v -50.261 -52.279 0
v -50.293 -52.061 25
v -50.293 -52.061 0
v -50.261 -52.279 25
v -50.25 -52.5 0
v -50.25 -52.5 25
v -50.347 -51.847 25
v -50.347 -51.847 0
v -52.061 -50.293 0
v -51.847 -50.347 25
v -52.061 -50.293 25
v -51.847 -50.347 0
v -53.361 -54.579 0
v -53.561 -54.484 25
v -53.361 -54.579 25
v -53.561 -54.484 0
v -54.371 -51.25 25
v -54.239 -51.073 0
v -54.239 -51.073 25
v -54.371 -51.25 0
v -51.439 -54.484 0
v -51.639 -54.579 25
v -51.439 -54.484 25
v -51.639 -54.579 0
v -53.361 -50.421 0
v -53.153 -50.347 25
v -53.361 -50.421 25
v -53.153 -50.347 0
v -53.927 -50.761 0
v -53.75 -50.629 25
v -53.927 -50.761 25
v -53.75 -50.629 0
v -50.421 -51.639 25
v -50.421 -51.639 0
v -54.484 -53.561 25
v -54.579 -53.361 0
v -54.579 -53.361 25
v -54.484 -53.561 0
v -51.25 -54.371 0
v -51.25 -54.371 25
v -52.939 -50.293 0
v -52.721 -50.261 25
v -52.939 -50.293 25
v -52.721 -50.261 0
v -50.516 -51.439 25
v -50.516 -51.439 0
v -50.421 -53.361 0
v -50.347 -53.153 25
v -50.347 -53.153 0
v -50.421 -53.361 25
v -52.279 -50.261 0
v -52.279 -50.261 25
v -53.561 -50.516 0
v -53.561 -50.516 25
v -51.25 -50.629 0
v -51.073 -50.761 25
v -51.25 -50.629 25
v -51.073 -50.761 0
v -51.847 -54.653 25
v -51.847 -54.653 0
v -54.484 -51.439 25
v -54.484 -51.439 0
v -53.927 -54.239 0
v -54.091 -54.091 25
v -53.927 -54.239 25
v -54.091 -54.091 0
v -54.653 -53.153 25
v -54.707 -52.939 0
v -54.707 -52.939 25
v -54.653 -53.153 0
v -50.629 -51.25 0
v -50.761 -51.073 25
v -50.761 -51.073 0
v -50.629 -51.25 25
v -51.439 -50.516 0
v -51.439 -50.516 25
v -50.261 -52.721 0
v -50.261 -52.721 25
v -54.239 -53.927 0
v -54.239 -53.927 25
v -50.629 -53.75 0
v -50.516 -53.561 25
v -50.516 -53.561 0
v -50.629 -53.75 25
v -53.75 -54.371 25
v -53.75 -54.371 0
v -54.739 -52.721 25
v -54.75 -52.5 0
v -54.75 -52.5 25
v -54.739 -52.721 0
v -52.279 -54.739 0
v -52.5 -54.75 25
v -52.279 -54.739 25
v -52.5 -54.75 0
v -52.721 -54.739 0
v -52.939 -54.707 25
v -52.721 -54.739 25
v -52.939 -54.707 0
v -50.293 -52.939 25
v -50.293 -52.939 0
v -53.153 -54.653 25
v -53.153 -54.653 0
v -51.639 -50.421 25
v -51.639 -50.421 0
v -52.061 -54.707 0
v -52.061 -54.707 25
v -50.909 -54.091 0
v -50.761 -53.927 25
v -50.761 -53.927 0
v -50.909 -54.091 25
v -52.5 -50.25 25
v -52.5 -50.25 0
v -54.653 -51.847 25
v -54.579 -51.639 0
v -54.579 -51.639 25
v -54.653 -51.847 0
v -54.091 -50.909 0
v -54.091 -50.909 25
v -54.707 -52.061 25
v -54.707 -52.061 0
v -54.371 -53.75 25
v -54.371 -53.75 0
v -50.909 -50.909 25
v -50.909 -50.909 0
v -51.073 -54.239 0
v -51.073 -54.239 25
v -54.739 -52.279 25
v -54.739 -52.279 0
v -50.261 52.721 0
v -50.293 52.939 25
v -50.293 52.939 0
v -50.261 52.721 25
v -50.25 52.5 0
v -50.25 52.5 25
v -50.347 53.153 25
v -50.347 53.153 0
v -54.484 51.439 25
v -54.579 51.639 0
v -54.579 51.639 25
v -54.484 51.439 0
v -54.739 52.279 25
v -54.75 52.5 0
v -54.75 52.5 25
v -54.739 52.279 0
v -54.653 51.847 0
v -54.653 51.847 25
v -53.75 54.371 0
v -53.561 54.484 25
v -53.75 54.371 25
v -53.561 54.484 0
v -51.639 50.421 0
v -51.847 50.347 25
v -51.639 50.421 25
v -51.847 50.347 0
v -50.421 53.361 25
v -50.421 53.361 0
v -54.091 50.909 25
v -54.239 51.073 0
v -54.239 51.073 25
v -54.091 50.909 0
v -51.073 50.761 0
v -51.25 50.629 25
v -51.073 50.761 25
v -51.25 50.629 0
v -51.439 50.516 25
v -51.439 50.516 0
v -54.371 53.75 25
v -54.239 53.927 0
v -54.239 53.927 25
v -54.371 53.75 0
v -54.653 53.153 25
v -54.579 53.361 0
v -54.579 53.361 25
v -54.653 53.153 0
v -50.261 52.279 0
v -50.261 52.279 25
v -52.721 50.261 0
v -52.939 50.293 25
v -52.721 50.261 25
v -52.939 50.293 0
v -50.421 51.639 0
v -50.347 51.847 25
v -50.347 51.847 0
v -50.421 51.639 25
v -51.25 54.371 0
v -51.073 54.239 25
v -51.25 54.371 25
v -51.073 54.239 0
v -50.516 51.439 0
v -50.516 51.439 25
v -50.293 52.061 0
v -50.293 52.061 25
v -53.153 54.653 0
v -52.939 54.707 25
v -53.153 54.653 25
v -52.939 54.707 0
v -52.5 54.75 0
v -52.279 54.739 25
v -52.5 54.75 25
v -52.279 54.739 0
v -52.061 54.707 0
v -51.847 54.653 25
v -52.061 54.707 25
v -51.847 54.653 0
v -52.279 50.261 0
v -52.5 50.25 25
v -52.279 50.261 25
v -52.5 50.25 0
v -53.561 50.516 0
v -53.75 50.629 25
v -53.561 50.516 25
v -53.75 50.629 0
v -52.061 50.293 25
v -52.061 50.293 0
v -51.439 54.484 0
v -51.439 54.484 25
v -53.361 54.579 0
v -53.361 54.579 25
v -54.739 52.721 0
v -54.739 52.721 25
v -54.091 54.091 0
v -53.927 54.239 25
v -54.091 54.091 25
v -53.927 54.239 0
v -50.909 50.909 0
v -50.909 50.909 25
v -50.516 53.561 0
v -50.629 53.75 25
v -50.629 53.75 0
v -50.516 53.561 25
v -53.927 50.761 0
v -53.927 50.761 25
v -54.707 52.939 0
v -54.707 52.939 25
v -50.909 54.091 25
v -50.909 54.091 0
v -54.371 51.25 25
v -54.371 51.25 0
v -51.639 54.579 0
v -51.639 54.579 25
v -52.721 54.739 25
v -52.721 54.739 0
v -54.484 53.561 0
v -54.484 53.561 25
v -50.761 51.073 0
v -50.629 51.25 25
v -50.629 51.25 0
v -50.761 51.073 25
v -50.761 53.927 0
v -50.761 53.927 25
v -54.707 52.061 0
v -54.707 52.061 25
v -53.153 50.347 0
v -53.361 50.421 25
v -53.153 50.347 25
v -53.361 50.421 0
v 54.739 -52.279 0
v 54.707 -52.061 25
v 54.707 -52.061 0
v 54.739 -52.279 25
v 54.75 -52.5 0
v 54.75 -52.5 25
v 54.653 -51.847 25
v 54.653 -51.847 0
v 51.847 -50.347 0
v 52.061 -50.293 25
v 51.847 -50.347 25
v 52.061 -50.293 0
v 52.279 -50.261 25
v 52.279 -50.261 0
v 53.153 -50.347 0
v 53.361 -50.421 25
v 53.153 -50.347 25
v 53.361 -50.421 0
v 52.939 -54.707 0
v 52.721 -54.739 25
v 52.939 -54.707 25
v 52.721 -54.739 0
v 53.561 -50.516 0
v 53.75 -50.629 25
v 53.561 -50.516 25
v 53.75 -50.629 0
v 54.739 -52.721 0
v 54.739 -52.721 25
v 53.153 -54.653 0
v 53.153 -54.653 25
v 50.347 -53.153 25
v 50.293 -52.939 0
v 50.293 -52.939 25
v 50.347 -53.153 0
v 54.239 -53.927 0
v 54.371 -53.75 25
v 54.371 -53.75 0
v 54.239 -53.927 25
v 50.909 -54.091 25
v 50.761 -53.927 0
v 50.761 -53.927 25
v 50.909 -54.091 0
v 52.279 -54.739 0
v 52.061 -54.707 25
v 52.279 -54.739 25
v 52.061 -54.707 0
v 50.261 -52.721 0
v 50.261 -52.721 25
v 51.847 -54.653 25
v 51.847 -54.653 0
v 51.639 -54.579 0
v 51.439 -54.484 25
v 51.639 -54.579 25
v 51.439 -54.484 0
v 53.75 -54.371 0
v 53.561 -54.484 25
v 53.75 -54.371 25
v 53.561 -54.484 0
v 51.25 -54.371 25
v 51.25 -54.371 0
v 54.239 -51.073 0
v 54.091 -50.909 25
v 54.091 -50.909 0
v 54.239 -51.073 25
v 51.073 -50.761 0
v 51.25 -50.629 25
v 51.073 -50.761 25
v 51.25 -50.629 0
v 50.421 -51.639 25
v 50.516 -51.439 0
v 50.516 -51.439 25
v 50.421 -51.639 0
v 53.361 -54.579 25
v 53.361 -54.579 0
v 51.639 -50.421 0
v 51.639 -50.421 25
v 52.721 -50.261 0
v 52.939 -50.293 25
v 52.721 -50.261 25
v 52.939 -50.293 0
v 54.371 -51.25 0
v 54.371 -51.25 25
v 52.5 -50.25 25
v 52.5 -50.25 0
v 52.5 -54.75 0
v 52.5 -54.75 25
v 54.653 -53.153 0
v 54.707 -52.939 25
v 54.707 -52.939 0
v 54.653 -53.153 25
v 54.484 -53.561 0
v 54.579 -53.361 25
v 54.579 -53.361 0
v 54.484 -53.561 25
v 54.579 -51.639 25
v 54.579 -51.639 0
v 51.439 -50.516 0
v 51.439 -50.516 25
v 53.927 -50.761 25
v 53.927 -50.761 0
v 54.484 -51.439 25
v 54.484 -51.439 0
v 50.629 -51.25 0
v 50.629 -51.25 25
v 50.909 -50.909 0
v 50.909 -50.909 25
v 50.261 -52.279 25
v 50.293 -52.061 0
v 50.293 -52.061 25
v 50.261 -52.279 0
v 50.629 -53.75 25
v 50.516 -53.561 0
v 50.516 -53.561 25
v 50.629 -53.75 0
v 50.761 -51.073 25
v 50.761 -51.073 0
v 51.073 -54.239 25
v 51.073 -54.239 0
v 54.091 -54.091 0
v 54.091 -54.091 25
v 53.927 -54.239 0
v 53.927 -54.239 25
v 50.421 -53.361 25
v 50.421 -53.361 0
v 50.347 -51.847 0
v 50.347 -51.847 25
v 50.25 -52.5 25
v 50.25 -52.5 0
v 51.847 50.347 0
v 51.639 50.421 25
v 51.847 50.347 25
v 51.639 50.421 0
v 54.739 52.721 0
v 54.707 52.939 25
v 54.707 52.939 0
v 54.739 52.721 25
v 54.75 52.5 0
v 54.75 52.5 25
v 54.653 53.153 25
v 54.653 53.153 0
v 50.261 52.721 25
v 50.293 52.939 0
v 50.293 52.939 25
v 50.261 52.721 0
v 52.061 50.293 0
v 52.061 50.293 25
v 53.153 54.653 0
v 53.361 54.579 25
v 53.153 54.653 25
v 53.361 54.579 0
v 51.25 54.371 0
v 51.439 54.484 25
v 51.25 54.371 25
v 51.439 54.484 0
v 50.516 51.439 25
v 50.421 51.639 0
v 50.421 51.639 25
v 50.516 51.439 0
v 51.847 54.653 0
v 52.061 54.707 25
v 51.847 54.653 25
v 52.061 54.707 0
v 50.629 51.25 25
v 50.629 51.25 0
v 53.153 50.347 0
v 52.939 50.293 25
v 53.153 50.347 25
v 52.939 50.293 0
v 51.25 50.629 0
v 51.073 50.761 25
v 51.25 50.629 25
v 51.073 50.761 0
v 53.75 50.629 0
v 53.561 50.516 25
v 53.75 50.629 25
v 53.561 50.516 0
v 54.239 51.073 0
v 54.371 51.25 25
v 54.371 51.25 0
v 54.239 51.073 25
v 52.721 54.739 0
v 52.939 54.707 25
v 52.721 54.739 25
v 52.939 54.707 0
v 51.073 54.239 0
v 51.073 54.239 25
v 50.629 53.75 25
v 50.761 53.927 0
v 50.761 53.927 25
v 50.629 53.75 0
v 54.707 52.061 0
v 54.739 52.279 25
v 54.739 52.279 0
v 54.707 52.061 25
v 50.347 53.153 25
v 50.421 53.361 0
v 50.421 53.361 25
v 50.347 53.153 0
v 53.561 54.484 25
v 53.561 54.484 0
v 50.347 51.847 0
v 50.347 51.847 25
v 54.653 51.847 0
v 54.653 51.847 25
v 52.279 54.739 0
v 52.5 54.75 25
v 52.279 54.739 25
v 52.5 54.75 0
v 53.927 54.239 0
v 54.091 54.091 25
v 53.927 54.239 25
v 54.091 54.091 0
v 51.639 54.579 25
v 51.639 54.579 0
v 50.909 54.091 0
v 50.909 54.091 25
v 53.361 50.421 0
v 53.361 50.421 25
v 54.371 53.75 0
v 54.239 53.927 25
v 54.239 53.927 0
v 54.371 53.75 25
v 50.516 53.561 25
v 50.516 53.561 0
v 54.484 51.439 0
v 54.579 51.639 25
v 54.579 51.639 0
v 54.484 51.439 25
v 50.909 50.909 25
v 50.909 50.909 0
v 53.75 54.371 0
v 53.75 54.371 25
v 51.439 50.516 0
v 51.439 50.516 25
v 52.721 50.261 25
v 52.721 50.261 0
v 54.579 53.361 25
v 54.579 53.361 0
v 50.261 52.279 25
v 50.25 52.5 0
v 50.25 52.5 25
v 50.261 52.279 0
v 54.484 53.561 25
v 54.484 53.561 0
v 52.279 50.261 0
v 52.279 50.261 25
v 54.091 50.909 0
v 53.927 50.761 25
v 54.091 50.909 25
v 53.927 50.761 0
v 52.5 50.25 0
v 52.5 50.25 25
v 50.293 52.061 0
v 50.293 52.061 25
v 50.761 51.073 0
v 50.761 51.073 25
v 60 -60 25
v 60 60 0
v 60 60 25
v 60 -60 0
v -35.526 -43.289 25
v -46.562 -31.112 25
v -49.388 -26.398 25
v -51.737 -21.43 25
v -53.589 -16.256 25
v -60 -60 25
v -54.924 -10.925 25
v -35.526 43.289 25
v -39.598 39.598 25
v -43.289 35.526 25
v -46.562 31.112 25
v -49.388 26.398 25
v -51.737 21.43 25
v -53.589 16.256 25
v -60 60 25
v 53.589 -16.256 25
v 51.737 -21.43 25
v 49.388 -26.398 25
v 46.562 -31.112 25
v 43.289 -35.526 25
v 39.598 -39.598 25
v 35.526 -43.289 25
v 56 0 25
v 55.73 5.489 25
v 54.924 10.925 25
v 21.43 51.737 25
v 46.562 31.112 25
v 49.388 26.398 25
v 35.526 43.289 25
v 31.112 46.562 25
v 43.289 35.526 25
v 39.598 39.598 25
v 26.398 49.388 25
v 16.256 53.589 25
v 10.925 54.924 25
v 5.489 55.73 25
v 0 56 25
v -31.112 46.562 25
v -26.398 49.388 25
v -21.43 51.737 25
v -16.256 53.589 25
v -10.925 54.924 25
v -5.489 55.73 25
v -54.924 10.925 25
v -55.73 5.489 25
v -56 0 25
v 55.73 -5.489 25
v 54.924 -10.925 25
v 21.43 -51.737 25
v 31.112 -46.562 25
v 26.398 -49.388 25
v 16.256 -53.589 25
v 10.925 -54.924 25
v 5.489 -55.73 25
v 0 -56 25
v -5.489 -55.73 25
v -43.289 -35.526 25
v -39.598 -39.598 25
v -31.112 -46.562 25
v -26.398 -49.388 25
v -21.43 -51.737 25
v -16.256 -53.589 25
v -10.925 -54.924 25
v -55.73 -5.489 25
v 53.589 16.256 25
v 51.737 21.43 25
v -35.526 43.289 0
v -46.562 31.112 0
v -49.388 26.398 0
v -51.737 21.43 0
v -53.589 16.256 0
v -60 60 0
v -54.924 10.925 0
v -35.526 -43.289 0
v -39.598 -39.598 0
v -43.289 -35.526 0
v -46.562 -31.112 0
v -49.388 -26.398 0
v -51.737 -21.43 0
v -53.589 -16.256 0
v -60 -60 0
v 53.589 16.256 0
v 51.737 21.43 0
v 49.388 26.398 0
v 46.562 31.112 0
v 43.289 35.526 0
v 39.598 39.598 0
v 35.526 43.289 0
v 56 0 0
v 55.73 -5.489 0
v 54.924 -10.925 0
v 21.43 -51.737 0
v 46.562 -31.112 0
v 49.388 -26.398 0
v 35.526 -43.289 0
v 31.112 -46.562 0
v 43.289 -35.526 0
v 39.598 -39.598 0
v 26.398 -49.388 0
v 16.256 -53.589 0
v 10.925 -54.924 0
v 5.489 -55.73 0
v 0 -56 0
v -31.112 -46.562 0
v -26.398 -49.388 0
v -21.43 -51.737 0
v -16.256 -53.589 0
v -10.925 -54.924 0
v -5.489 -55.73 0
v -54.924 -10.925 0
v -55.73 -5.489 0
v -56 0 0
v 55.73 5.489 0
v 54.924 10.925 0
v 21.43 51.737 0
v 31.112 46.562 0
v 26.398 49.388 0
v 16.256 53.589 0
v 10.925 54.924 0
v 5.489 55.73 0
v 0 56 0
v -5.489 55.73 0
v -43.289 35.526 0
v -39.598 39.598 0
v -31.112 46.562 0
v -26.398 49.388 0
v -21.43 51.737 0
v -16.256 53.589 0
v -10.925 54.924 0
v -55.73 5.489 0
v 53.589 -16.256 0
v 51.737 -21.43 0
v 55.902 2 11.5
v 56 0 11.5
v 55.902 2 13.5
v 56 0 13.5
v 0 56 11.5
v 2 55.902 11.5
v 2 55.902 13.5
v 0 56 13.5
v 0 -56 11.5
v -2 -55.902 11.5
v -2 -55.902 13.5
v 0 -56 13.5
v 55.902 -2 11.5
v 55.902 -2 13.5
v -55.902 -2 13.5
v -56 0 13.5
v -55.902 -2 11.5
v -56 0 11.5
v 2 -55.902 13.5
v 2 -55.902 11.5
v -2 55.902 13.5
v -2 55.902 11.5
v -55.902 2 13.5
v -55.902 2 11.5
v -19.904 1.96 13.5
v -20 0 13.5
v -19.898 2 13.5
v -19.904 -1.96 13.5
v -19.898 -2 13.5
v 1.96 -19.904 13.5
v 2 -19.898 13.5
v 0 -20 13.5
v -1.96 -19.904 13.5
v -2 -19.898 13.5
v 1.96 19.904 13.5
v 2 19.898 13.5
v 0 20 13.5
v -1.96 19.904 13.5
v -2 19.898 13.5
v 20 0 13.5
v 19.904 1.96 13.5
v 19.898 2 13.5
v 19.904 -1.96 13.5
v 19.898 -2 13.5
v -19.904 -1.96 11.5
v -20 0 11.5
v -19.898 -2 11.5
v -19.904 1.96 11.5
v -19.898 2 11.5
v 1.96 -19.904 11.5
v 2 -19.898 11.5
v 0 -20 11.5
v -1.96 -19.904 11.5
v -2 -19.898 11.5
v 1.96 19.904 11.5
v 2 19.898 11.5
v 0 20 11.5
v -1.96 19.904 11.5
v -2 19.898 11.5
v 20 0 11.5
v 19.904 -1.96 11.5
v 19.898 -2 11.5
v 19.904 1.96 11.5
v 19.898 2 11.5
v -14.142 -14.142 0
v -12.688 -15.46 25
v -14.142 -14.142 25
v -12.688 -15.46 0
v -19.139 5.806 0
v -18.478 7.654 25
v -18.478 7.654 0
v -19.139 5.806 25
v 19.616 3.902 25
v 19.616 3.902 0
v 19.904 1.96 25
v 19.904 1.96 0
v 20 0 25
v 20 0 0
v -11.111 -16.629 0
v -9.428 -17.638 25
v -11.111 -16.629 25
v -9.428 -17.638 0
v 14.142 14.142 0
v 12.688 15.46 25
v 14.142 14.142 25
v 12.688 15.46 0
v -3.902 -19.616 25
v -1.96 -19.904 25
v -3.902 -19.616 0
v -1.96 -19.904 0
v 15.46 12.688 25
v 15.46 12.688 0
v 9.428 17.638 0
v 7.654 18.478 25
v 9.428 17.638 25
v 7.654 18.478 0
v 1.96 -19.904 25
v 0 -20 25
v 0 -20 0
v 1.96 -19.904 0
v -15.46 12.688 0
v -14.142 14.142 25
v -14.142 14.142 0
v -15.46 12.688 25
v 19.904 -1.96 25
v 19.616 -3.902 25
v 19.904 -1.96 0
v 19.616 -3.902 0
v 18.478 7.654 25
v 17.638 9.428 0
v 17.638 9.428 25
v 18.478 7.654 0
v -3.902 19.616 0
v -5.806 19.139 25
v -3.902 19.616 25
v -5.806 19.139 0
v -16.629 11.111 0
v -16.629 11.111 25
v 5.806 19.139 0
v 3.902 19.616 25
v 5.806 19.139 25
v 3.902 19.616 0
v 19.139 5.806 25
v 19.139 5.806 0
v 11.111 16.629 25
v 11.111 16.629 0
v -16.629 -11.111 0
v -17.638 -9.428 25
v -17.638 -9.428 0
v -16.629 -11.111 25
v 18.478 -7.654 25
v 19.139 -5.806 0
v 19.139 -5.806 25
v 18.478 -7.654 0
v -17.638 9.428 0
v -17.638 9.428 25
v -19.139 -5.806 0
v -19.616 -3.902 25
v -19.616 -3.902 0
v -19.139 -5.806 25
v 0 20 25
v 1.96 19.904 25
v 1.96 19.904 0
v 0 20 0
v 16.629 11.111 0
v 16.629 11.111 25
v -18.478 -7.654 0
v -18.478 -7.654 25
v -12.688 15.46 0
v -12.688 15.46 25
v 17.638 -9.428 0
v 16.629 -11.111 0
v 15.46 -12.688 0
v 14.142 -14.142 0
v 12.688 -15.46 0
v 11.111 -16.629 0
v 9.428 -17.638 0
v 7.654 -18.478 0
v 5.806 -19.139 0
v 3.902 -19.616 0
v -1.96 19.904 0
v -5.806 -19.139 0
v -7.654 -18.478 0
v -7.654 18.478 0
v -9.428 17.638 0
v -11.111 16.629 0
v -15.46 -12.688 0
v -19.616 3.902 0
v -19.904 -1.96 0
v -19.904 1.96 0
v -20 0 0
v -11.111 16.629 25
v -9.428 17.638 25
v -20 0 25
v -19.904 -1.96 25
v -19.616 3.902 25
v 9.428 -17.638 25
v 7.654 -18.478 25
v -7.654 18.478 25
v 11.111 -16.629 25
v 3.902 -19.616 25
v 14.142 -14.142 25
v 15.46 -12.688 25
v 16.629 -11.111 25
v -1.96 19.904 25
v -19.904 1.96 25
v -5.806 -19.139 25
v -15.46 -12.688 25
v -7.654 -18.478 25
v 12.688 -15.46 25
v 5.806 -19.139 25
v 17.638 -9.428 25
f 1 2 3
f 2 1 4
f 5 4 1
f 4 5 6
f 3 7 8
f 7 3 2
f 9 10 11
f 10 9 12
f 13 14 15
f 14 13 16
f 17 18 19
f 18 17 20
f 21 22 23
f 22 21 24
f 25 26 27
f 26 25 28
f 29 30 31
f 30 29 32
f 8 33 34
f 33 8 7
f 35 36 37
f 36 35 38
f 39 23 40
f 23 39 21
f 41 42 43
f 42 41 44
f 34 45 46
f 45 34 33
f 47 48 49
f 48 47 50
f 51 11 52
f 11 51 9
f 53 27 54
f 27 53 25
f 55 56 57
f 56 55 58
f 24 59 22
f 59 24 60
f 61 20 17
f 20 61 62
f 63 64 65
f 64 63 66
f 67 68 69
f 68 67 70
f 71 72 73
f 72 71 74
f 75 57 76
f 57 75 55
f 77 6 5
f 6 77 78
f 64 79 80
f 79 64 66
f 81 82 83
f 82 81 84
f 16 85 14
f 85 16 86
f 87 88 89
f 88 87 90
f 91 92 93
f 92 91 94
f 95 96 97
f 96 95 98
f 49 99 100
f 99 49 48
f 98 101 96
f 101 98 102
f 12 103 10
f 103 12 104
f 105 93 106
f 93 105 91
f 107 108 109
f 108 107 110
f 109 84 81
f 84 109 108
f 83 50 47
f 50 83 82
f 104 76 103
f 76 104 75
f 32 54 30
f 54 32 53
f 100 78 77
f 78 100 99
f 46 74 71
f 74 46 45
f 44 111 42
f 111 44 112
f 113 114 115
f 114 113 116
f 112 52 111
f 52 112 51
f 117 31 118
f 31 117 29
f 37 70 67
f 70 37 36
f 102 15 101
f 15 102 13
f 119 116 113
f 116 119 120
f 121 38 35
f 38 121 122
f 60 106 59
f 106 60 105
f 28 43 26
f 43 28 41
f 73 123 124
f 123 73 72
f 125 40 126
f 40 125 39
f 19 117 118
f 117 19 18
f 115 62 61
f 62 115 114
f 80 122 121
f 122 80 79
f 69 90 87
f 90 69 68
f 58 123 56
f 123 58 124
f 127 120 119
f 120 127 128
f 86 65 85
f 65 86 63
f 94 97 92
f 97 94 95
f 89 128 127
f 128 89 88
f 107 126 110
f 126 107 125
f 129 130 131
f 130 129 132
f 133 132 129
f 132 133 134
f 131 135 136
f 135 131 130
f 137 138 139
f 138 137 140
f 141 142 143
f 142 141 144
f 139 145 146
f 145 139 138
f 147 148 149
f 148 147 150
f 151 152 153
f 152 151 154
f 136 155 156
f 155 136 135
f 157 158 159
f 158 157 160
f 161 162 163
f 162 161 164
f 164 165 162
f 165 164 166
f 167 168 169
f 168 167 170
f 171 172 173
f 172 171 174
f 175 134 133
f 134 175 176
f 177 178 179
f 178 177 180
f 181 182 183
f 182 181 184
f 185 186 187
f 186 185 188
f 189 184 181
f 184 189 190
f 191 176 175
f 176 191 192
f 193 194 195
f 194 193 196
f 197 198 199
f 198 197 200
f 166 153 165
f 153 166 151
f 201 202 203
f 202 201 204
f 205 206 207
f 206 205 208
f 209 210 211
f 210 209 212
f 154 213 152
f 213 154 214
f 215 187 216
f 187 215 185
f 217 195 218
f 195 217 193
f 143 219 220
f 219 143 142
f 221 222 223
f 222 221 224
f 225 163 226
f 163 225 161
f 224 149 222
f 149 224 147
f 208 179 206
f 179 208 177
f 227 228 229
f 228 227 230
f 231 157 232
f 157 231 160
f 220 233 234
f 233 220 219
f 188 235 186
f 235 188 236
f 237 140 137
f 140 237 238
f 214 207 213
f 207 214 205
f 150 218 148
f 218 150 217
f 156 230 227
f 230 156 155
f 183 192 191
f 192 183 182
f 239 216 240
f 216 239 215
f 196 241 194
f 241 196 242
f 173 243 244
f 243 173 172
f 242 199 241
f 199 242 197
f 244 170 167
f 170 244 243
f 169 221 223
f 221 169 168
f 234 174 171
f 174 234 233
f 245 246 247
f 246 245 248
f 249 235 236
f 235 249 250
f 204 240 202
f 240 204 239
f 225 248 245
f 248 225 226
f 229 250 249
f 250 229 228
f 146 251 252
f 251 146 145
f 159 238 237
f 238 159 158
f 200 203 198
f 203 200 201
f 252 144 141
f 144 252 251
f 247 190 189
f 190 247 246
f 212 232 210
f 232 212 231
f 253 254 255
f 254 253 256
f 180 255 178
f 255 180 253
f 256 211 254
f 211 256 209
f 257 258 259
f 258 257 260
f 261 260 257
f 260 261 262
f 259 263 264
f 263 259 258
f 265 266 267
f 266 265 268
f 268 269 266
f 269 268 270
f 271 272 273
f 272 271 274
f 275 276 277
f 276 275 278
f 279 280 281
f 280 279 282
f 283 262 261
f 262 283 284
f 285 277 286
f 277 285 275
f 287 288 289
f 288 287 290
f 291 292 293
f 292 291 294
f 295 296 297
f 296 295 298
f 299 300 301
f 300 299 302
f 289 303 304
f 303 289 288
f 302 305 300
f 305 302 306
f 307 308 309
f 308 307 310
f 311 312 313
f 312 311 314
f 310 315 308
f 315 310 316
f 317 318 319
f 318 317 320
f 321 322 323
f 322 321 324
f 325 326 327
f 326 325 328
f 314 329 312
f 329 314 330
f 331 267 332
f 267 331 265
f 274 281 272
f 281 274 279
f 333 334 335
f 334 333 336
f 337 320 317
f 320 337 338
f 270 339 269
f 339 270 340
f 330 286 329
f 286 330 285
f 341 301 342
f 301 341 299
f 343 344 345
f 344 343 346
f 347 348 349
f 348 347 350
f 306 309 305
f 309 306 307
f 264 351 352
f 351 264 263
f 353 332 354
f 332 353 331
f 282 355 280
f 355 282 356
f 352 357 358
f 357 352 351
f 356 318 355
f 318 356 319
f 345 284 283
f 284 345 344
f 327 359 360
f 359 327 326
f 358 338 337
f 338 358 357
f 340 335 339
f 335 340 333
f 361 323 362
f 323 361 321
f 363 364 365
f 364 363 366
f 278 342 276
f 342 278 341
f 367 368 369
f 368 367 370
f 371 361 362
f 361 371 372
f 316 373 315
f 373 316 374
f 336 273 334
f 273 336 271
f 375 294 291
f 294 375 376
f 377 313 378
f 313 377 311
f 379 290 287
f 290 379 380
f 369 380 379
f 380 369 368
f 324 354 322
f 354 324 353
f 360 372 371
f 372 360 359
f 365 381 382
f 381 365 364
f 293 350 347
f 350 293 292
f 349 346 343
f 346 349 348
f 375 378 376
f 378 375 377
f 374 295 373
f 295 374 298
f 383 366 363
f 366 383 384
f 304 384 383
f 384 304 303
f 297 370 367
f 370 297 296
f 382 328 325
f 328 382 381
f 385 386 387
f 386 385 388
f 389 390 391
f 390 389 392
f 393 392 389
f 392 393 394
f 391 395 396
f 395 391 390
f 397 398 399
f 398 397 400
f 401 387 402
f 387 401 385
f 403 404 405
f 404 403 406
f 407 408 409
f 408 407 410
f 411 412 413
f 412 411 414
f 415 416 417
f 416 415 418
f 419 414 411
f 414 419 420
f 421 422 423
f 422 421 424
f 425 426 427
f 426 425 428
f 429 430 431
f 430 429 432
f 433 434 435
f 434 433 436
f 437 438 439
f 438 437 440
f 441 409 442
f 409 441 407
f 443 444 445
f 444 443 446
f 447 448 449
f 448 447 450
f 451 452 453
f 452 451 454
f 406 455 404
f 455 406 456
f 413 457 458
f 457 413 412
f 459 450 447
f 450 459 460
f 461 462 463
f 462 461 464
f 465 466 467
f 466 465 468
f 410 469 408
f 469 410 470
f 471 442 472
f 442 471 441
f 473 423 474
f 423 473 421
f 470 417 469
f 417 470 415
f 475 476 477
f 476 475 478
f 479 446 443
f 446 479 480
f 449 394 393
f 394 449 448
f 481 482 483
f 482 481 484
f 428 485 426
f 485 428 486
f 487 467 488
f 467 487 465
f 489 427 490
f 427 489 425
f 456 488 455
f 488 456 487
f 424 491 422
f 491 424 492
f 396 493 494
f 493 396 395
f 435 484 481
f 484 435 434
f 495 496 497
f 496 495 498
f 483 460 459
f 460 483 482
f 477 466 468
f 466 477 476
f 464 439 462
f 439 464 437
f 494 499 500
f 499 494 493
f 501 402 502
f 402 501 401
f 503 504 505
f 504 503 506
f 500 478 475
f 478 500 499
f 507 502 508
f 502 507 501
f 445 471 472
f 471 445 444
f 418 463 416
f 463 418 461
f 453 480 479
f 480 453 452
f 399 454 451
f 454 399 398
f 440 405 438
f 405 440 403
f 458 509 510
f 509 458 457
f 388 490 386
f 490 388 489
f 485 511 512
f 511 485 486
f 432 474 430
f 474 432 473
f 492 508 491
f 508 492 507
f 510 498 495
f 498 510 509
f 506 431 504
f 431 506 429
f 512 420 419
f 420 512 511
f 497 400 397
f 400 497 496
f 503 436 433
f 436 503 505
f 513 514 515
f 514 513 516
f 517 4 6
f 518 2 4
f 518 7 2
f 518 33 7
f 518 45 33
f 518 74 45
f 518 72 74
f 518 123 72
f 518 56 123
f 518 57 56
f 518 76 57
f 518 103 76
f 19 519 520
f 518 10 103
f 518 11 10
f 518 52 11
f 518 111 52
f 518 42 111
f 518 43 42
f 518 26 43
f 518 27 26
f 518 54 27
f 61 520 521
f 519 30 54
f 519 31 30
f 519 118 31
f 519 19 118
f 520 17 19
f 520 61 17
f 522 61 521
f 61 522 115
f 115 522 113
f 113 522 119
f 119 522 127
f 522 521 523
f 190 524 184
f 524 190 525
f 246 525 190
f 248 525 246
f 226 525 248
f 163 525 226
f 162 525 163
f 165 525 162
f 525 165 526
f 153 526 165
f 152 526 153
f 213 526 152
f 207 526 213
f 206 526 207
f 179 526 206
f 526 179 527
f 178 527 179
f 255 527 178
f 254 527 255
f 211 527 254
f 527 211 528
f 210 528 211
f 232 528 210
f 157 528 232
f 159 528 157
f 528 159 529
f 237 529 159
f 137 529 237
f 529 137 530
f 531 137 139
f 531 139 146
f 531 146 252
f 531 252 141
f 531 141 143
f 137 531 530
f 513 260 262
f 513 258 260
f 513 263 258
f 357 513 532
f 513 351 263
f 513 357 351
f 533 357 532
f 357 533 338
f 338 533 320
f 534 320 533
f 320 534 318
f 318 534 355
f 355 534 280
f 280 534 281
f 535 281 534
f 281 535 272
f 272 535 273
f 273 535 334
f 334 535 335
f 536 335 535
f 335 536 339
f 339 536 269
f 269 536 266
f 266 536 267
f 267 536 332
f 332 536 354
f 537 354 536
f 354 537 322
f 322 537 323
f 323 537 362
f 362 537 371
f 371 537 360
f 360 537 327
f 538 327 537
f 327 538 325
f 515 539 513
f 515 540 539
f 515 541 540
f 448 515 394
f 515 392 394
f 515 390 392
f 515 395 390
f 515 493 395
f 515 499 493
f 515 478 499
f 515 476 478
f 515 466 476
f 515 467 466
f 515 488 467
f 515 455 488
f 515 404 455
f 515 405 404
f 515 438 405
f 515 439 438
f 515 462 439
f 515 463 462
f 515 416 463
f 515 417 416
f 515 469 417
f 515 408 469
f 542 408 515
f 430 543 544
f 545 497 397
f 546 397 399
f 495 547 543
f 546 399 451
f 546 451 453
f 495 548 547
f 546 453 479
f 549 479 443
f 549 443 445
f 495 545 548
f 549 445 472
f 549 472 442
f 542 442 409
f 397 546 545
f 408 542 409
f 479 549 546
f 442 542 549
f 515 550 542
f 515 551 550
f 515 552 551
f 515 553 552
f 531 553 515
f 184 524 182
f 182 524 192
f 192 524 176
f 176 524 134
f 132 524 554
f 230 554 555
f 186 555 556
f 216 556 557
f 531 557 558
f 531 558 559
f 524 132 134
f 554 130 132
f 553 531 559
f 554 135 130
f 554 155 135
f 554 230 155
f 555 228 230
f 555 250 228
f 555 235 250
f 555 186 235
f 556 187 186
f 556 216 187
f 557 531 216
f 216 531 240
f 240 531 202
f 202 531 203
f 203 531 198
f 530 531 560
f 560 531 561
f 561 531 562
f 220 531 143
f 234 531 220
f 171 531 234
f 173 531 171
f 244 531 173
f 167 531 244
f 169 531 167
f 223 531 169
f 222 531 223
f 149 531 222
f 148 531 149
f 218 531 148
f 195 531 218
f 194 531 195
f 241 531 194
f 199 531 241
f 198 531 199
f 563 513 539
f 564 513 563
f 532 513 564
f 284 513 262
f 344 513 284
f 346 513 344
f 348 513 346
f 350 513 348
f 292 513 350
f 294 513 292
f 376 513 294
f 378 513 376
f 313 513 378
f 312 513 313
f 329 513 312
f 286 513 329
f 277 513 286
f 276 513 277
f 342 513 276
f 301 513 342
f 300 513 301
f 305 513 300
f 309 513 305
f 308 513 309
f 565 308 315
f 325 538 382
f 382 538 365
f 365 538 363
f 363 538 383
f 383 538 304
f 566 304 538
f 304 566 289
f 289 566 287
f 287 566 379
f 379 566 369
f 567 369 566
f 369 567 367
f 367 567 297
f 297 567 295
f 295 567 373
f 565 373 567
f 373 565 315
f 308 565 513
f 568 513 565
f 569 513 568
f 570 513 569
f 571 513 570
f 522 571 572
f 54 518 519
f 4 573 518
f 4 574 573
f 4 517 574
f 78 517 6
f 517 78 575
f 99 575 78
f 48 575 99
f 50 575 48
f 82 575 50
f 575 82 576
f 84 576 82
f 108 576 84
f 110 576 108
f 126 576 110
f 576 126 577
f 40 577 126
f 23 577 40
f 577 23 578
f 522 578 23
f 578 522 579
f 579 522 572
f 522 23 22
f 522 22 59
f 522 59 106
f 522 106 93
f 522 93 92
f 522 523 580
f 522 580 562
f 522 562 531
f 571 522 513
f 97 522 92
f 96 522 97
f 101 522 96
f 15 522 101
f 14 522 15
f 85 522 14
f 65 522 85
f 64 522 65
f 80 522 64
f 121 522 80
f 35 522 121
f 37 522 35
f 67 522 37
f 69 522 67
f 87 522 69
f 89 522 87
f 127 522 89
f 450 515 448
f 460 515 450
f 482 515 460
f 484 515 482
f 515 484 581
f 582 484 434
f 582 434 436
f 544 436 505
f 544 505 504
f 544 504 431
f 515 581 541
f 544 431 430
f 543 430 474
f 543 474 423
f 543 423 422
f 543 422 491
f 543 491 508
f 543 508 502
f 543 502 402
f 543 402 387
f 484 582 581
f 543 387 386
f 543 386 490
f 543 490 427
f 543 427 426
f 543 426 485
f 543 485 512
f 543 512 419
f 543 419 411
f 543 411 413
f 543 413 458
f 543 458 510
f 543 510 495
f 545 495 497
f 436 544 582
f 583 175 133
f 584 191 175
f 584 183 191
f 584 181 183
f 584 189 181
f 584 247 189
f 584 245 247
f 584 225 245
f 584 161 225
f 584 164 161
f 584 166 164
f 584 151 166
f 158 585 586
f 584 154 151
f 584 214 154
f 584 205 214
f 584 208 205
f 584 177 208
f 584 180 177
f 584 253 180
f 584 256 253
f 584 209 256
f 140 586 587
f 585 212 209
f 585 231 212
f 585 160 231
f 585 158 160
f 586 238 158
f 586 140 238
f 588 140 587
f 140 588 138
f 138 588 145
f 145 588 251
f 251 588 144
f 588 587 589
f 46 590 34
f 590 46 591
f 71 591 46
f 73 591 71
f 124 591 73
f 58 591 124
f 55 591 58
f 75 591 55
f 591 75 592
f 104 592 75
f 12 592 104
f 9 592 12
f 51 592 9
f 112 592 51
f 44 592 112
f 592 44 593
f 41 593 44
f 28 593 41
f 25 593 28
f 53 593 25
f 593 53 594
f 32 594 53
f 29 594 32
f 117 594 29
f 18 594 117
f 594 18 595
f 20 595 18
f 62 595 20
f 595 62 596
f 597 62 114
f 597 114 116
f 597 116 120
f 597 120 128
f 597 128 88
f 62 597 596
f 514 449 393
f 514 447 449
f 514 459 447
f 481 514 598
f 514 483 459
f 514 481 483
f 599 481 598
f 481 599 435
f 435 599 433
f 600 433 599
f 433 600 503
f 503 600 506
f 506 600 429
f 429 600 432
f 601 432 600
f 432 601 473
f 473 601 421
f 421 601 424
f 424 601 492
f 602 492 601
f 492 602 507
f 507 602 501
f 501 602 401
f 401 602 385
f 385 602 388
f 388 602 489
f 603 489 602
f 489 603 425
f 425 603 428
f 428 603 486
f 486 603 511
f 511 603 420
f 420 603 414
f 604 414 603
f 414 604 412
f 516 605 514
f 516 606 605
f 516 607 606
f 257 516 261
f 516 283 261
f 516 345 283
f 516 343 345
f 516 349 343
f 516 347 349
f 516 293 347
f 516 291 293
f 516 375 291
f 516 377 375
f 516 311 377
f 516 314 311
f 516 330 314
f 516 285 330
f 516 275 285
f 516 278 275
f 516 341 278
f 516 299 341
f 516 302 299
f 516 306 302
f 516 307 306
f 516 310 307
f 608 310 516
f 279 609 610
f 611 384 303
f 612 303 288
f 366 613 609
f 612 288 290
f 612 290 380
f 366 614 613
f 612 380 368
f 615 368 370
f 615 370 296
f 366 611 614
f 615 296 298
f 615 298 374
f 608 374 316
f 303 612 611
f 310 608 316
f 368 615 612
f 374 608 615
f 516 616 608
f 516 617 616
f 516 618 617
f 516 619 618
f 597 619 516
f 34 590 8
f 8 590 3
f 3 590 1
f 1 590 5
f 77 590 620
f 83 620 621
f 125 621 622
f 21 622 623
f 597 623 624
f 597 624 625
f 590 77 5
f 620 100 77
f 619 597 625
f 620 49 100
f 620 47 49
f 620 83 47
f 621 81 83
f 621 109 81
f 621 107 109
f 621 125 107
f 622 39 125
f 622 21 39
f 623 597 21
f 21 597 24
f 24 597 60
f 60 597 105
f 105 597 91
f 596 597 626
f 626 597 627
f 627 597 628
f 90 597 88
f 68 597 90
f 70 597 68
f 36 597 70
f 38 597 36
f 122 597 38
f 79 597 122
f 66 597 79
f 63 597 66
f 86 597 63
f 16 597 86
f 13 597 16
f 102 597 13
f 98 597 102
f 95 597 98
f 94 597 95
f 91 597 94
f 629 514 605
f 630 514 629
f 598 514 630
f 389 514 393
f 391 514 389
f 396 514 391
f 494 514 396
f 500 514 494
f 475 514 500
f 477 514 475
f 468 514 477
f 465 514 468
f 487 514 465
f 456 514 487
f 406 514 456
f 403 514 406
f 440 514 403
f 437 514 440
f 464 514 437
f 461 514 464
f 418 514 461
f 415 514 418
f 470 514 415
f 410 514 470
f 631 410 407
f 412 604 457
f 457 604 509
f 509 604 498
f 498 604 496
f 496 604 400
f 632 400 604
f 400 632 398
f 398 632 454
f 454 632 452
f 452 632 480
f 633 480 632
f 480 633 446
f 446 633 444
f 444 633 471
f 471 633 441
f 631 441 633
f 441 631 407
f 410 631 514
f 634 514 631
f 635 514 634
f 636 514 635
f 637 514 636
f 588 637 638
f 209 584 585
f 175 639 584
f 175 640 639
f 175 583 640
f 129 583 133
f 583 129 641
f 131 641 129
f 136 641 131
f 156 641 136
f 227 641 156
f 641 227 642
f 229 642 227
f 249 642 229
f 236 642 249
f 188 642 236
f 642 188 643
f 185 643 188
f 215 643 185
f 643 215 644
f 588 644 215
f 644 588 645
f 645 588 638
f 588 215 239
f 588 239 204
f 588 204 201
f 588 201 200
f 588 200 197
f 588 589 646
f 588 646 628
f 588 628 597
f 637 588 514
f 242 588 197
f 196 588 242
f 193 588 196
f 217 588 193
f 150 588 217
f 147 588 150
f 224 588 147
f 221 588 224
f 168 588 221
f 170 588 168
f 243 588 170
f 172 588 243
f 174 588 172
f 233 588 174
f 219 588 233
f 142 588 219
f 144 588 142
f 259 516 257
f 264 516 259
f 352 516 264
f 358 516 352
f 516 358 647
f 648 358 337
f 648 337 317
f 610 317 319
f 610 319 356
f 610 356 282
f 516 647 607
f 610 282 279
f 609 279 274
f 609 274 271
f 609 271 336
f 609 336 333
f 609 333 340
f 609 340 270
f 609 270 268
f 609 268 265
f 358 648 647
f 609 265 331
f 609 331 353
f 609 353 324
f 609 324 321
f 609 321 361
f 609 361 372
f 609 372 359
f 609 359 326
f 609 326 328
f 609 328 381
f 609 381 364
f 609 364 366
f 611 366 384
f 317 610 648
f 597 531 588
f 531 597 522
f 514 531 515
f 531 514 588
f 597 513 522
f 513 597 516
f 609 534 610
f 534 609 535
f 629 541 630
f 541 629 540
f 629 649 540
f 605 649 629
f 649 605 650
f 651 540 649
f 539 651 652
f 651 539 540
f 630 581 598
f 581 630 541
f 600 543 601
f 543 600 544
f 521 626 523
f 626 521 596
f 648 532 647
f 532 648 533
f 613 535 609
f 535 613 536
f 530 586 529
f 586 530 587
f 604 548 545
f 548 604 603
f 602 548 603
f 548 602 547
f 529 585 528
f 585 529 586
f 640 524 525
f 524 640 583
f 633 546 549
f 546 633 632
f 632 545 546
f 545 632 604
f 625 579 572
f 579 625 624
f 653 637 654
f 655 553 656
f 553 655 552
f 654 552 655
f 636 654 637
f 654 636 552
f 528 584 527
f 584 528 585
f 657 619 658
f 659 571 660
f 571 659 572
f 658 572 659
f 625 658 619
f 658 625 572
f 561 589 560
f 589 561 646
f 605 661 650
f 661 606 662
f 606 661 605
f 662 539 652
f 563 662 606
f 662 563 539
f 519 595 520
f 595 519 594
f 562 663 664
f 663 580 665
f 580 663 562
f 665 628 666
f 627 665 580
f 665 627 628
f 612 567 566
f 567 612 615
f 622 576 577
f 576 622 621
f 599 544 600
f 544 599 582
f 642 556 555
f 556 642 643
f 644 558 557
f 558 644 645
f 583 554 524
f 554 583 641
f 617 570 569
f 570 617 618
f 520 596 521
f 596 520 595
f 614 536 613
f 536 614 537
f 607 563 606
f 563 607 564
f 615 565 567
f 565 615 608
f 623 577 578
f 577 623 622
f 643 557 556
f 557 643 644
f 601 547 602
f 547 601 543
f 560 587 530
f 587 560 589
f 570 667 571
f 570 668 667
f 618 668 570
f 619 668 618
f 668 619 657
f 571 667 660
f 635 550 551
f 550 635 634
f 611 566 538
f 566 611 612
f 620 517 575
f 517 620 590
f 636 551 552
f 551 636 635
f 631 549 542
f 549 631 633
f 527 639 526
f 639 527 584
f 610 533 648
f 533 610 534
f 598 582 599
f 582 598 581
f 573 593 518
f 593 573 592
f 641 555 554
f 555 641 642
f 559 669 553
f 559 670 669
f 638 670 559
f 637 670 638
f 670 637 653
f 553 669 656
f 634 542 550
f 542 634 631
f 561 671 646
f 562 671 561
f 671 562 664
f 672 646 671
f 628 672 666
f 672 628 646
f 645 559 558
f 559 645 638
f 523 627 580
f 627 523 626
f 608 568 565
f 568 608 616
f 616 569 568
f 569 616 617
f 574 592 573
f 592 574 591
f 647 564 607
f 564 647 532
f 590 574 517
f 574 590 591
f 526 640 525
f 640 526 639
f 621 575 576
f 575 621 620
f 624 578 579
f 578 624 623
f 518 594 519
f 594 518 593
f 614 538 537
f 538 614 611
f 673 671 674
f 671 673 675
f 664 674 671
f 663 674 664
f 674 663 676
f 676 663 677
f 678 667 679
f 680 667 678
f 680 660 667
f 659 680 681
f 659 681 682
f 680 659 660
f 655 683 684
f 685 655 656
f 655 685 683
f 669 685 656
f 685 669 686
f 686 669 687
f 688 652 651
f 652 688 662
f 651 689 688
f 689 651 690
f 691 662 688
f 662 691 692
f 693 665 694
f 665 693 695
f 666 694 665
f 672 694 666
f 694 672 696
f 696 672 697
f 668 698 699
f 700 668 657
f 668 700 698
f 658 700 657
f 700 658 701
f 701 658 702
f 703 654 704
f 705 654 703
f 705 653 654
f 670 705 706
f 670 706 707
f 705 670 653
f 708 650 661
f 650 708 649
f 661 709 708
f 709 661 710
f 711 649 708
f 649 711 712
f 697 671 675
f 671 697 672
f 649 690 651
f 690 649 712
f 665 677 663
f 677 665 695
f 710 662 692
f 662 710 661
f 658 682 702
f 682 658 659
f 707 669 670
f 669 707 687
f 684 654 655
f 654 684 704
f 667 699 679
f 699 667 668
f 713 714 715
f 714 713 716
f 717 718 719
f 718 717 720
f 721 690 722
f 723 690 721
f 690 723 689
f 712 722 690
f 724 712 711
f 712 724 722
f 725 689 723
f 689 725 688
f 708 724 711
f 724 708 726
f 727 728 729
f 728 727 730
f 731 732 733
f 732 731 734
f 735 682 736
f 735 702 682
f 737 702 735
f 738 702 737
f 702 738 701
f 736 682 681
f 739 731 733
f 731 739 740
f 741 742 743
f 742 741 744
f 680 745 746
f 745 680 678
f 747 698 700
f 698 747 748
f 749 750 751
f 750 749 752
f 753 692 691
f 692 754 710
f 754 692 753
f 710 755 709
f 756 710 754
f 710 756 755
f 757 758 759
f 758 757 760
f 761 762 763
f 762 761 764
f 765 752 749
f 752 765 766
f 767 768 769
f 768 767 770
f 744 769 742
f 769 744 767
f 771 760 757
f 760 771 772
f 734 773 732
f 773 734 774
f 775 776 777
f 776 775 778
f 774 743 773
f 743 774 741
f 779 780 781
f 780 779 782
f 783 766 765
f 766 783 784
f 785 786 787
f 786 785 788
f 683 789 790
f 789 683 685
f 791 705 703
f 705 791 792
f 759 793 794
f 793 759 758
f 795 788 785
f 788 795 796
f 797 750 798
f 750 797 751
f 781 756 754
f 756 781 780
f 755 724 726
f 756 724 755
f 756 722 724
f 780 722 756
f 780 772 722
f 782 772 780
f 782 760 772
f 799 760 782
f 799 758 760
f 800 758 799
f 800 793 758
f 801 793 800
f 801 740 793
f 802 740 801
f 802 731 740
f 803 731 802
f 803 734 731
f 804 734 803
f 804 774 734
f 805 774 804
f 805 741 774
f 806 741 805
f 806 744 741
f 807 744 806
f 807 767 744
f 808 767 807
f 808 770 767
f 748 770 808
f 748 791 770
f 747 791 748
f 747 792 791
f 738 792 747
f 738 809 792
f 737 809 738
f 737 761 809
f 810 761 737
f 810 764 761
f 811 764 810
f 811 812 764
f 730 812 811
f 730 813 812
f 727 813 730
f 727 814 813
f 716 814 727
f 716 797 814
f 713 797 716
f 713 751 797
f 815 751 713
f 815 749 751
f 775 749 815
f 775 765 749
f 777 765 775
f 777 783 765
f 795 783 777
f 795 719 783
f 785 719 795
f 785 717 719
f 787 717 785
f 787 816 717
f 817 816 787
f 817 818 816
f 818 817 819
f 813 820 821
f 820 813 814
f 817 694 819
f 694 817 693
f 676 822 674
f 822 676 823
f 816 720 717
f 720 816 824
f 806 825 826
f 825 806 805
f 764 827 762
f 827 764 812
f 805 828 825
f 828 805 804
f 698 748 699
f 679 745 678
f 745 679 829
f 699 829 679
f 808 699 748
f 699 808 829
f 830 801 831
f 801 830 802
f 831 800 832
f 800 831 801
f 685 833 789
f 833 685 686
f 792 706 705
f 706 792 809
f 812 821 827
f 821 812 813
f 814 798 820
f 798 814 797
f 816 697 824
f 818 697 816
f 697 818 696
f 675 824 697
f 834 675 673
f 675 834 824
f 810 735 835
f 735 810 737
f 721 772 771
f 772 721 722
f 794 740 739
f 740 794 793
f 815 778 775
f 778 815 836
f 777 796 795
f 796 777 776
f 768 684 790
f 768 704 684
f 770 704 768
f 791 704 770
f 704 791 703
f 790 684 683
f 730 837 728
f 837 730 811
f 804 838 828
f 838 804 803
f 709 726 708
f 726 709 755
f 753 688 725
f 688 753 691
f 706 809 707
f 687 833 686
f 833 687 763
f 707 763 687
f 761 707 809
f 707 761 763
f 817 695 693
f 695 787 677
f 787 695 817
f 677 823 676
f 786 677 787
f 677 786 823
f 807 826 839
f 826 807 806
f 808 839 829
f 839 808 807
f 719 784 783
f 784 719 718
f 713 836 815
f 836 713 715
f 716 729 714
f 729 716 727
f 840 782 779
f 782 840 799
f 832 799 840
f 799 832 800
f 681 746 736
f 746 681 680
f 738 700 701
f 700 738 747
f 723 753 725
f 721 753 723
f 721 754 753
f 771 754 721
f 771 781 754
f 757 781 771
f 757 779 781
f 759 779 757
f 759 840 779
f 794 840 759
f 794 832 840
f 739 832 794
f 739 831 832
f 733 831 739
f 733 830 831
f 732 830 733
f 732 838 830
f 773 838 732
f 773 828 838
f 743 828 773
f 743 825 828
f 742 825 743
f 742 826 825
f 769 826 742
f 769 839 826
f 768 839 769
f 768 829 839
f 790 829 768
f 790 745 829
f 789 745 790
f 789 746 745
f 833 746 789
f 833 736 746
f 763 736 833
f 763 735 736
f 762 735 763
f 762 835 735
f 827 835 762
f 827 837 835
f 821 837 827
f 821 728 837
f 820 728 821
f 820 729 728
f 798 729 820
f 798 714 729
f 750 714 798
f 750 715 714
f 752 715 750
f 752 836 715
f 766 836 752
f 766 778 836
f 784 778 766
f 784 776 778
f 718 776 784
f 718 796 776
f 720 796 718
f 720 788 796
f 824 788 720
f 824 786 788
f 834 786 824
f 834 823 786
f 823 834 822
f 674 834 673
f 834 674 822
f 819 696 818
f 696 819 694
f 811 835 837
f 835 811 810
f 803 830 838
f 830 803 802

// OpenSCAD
// file: config.scad
// ============================================================
//  config.scad — shared dimensions (single source of truth)
//  Every other file includes this. Change a number here and
//  the part files AND the assembly update together.
//  Units: mm.  Z is up.
// ============================================================

/* ----- rack ----- */
U       = 44.45;
span_U  = 6;
span    = span_U * U;        // 266.7 — spine length / mount span
post_t  = 4;
post_w  = 25;

/* ----- fan ----- */
fan_size  = 120;
fan_thick = 25;
fan_pitch = 105;
fan_hole_d = 4.5;            // M4 clearance (anti-vibration washers under the head)
bore_d    = 112;

/* ----- carrier ----- */
thickness       = 6;         // one thickness -> flat part (print or waterjet/CNC)
frame_corner_r  = 4;
gap_to_spine    = 6;
mount_bolt_d    = 5.5;       // M5 clearance into T-nuts
mount_bolt_span = 90;
slot_travel     = 6;
flange_height   = 100;

/* ----- spine (2020) ----- */
ext_width  = 20;

/* ----- fan heights along the rail ----- */
fan1_z = fan_size/2 + 5;
fan2_z = span - fan_size/2 - 5;

/* ----- derived placement (shared by carrier + spine + bracket) ----- */
spine_face_x   = fan_size/2 + gap_to_spine;   // 66
spine_center_x = spine_face_x + ext_width/2;  // 76
wing_x0        = fan_size/2 - 4;              // 56
wing_x1        = spine_face_x + ext_width;    // 86
post_x         = wing_x1 + 12;                // 98 (post inner face)

$fn = 64;
eps = 0.01;
// main file
// ============================================================
//  fan_dummy.scad — stand-in 120 mm fan (you BUY the real one)
//  Just for visualising fit/clearance in the assembly.
// ============================================================
include <config.scad>

module fan_dummy() {
    color([0.25, 0.25, 0.27]) {
        difference() {
            translate([-fan_size/2, -fan_size/2, 0])
                cube([fan_size, fan_size, fan_thick]);
            translate([0, 0, -eps])
                cylinder(h = fan_thick + 2*eps, d = bore_d);
            for (sx = [-1, 1], sy = [-1, 1])
                translate([sx*fan_pitch/2, sy*fan_pitch/2, -eps])
                    cylinder(h = fan_thick + 2*eps, d = fan_hole_d);
        }
        cylinder(h = fan_thick, d = 40);                 // hub
        for (a = [0 : 90 : 359])                         // struts
            rotate([0, 0, a]) translate([0, 0, fan_thick/2])
                cube([bore_d, 4, 2], center = true);
    }
}

fan_dummy();
